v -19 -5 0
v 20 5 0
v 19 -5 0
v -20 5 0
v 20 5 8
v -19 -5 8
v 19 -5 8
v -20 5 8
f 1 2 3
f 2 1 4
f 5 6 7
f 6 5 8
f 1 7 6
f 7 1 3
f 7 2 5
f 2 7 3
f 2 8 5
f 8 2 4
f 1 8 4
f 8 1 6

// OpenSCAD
// Rectangular shaft key with chamfered ends.
$fn = 60;
eps = 0.02;
key_w = 10;
key_h = 8;
key_l = 40;
chamfer = 1;
polyhedron(points = [
    [-key_l / 2 + chamfer, -key_w / 2, 0], [key_l / 2 - chamfer, -key_w / 2, 0], [key_l / 2, key_w / 2, 0], [-key_l / 2, key_w / 2, 0],
    [-key_l / 2 + chamfer, -key_w / 2, key_h], [key_l / 2 - chamfer, -key_w / 2, key_h], [key_l / 2, key_w / 2, key_h], [-key_l / 2, key_w / 2, key_h]
], faces = [[0,1,2,3],[4,7,6,5],[0,4,5,1],[1,5,6,2],[2,6,7,3],[3,7,4,0]]);
